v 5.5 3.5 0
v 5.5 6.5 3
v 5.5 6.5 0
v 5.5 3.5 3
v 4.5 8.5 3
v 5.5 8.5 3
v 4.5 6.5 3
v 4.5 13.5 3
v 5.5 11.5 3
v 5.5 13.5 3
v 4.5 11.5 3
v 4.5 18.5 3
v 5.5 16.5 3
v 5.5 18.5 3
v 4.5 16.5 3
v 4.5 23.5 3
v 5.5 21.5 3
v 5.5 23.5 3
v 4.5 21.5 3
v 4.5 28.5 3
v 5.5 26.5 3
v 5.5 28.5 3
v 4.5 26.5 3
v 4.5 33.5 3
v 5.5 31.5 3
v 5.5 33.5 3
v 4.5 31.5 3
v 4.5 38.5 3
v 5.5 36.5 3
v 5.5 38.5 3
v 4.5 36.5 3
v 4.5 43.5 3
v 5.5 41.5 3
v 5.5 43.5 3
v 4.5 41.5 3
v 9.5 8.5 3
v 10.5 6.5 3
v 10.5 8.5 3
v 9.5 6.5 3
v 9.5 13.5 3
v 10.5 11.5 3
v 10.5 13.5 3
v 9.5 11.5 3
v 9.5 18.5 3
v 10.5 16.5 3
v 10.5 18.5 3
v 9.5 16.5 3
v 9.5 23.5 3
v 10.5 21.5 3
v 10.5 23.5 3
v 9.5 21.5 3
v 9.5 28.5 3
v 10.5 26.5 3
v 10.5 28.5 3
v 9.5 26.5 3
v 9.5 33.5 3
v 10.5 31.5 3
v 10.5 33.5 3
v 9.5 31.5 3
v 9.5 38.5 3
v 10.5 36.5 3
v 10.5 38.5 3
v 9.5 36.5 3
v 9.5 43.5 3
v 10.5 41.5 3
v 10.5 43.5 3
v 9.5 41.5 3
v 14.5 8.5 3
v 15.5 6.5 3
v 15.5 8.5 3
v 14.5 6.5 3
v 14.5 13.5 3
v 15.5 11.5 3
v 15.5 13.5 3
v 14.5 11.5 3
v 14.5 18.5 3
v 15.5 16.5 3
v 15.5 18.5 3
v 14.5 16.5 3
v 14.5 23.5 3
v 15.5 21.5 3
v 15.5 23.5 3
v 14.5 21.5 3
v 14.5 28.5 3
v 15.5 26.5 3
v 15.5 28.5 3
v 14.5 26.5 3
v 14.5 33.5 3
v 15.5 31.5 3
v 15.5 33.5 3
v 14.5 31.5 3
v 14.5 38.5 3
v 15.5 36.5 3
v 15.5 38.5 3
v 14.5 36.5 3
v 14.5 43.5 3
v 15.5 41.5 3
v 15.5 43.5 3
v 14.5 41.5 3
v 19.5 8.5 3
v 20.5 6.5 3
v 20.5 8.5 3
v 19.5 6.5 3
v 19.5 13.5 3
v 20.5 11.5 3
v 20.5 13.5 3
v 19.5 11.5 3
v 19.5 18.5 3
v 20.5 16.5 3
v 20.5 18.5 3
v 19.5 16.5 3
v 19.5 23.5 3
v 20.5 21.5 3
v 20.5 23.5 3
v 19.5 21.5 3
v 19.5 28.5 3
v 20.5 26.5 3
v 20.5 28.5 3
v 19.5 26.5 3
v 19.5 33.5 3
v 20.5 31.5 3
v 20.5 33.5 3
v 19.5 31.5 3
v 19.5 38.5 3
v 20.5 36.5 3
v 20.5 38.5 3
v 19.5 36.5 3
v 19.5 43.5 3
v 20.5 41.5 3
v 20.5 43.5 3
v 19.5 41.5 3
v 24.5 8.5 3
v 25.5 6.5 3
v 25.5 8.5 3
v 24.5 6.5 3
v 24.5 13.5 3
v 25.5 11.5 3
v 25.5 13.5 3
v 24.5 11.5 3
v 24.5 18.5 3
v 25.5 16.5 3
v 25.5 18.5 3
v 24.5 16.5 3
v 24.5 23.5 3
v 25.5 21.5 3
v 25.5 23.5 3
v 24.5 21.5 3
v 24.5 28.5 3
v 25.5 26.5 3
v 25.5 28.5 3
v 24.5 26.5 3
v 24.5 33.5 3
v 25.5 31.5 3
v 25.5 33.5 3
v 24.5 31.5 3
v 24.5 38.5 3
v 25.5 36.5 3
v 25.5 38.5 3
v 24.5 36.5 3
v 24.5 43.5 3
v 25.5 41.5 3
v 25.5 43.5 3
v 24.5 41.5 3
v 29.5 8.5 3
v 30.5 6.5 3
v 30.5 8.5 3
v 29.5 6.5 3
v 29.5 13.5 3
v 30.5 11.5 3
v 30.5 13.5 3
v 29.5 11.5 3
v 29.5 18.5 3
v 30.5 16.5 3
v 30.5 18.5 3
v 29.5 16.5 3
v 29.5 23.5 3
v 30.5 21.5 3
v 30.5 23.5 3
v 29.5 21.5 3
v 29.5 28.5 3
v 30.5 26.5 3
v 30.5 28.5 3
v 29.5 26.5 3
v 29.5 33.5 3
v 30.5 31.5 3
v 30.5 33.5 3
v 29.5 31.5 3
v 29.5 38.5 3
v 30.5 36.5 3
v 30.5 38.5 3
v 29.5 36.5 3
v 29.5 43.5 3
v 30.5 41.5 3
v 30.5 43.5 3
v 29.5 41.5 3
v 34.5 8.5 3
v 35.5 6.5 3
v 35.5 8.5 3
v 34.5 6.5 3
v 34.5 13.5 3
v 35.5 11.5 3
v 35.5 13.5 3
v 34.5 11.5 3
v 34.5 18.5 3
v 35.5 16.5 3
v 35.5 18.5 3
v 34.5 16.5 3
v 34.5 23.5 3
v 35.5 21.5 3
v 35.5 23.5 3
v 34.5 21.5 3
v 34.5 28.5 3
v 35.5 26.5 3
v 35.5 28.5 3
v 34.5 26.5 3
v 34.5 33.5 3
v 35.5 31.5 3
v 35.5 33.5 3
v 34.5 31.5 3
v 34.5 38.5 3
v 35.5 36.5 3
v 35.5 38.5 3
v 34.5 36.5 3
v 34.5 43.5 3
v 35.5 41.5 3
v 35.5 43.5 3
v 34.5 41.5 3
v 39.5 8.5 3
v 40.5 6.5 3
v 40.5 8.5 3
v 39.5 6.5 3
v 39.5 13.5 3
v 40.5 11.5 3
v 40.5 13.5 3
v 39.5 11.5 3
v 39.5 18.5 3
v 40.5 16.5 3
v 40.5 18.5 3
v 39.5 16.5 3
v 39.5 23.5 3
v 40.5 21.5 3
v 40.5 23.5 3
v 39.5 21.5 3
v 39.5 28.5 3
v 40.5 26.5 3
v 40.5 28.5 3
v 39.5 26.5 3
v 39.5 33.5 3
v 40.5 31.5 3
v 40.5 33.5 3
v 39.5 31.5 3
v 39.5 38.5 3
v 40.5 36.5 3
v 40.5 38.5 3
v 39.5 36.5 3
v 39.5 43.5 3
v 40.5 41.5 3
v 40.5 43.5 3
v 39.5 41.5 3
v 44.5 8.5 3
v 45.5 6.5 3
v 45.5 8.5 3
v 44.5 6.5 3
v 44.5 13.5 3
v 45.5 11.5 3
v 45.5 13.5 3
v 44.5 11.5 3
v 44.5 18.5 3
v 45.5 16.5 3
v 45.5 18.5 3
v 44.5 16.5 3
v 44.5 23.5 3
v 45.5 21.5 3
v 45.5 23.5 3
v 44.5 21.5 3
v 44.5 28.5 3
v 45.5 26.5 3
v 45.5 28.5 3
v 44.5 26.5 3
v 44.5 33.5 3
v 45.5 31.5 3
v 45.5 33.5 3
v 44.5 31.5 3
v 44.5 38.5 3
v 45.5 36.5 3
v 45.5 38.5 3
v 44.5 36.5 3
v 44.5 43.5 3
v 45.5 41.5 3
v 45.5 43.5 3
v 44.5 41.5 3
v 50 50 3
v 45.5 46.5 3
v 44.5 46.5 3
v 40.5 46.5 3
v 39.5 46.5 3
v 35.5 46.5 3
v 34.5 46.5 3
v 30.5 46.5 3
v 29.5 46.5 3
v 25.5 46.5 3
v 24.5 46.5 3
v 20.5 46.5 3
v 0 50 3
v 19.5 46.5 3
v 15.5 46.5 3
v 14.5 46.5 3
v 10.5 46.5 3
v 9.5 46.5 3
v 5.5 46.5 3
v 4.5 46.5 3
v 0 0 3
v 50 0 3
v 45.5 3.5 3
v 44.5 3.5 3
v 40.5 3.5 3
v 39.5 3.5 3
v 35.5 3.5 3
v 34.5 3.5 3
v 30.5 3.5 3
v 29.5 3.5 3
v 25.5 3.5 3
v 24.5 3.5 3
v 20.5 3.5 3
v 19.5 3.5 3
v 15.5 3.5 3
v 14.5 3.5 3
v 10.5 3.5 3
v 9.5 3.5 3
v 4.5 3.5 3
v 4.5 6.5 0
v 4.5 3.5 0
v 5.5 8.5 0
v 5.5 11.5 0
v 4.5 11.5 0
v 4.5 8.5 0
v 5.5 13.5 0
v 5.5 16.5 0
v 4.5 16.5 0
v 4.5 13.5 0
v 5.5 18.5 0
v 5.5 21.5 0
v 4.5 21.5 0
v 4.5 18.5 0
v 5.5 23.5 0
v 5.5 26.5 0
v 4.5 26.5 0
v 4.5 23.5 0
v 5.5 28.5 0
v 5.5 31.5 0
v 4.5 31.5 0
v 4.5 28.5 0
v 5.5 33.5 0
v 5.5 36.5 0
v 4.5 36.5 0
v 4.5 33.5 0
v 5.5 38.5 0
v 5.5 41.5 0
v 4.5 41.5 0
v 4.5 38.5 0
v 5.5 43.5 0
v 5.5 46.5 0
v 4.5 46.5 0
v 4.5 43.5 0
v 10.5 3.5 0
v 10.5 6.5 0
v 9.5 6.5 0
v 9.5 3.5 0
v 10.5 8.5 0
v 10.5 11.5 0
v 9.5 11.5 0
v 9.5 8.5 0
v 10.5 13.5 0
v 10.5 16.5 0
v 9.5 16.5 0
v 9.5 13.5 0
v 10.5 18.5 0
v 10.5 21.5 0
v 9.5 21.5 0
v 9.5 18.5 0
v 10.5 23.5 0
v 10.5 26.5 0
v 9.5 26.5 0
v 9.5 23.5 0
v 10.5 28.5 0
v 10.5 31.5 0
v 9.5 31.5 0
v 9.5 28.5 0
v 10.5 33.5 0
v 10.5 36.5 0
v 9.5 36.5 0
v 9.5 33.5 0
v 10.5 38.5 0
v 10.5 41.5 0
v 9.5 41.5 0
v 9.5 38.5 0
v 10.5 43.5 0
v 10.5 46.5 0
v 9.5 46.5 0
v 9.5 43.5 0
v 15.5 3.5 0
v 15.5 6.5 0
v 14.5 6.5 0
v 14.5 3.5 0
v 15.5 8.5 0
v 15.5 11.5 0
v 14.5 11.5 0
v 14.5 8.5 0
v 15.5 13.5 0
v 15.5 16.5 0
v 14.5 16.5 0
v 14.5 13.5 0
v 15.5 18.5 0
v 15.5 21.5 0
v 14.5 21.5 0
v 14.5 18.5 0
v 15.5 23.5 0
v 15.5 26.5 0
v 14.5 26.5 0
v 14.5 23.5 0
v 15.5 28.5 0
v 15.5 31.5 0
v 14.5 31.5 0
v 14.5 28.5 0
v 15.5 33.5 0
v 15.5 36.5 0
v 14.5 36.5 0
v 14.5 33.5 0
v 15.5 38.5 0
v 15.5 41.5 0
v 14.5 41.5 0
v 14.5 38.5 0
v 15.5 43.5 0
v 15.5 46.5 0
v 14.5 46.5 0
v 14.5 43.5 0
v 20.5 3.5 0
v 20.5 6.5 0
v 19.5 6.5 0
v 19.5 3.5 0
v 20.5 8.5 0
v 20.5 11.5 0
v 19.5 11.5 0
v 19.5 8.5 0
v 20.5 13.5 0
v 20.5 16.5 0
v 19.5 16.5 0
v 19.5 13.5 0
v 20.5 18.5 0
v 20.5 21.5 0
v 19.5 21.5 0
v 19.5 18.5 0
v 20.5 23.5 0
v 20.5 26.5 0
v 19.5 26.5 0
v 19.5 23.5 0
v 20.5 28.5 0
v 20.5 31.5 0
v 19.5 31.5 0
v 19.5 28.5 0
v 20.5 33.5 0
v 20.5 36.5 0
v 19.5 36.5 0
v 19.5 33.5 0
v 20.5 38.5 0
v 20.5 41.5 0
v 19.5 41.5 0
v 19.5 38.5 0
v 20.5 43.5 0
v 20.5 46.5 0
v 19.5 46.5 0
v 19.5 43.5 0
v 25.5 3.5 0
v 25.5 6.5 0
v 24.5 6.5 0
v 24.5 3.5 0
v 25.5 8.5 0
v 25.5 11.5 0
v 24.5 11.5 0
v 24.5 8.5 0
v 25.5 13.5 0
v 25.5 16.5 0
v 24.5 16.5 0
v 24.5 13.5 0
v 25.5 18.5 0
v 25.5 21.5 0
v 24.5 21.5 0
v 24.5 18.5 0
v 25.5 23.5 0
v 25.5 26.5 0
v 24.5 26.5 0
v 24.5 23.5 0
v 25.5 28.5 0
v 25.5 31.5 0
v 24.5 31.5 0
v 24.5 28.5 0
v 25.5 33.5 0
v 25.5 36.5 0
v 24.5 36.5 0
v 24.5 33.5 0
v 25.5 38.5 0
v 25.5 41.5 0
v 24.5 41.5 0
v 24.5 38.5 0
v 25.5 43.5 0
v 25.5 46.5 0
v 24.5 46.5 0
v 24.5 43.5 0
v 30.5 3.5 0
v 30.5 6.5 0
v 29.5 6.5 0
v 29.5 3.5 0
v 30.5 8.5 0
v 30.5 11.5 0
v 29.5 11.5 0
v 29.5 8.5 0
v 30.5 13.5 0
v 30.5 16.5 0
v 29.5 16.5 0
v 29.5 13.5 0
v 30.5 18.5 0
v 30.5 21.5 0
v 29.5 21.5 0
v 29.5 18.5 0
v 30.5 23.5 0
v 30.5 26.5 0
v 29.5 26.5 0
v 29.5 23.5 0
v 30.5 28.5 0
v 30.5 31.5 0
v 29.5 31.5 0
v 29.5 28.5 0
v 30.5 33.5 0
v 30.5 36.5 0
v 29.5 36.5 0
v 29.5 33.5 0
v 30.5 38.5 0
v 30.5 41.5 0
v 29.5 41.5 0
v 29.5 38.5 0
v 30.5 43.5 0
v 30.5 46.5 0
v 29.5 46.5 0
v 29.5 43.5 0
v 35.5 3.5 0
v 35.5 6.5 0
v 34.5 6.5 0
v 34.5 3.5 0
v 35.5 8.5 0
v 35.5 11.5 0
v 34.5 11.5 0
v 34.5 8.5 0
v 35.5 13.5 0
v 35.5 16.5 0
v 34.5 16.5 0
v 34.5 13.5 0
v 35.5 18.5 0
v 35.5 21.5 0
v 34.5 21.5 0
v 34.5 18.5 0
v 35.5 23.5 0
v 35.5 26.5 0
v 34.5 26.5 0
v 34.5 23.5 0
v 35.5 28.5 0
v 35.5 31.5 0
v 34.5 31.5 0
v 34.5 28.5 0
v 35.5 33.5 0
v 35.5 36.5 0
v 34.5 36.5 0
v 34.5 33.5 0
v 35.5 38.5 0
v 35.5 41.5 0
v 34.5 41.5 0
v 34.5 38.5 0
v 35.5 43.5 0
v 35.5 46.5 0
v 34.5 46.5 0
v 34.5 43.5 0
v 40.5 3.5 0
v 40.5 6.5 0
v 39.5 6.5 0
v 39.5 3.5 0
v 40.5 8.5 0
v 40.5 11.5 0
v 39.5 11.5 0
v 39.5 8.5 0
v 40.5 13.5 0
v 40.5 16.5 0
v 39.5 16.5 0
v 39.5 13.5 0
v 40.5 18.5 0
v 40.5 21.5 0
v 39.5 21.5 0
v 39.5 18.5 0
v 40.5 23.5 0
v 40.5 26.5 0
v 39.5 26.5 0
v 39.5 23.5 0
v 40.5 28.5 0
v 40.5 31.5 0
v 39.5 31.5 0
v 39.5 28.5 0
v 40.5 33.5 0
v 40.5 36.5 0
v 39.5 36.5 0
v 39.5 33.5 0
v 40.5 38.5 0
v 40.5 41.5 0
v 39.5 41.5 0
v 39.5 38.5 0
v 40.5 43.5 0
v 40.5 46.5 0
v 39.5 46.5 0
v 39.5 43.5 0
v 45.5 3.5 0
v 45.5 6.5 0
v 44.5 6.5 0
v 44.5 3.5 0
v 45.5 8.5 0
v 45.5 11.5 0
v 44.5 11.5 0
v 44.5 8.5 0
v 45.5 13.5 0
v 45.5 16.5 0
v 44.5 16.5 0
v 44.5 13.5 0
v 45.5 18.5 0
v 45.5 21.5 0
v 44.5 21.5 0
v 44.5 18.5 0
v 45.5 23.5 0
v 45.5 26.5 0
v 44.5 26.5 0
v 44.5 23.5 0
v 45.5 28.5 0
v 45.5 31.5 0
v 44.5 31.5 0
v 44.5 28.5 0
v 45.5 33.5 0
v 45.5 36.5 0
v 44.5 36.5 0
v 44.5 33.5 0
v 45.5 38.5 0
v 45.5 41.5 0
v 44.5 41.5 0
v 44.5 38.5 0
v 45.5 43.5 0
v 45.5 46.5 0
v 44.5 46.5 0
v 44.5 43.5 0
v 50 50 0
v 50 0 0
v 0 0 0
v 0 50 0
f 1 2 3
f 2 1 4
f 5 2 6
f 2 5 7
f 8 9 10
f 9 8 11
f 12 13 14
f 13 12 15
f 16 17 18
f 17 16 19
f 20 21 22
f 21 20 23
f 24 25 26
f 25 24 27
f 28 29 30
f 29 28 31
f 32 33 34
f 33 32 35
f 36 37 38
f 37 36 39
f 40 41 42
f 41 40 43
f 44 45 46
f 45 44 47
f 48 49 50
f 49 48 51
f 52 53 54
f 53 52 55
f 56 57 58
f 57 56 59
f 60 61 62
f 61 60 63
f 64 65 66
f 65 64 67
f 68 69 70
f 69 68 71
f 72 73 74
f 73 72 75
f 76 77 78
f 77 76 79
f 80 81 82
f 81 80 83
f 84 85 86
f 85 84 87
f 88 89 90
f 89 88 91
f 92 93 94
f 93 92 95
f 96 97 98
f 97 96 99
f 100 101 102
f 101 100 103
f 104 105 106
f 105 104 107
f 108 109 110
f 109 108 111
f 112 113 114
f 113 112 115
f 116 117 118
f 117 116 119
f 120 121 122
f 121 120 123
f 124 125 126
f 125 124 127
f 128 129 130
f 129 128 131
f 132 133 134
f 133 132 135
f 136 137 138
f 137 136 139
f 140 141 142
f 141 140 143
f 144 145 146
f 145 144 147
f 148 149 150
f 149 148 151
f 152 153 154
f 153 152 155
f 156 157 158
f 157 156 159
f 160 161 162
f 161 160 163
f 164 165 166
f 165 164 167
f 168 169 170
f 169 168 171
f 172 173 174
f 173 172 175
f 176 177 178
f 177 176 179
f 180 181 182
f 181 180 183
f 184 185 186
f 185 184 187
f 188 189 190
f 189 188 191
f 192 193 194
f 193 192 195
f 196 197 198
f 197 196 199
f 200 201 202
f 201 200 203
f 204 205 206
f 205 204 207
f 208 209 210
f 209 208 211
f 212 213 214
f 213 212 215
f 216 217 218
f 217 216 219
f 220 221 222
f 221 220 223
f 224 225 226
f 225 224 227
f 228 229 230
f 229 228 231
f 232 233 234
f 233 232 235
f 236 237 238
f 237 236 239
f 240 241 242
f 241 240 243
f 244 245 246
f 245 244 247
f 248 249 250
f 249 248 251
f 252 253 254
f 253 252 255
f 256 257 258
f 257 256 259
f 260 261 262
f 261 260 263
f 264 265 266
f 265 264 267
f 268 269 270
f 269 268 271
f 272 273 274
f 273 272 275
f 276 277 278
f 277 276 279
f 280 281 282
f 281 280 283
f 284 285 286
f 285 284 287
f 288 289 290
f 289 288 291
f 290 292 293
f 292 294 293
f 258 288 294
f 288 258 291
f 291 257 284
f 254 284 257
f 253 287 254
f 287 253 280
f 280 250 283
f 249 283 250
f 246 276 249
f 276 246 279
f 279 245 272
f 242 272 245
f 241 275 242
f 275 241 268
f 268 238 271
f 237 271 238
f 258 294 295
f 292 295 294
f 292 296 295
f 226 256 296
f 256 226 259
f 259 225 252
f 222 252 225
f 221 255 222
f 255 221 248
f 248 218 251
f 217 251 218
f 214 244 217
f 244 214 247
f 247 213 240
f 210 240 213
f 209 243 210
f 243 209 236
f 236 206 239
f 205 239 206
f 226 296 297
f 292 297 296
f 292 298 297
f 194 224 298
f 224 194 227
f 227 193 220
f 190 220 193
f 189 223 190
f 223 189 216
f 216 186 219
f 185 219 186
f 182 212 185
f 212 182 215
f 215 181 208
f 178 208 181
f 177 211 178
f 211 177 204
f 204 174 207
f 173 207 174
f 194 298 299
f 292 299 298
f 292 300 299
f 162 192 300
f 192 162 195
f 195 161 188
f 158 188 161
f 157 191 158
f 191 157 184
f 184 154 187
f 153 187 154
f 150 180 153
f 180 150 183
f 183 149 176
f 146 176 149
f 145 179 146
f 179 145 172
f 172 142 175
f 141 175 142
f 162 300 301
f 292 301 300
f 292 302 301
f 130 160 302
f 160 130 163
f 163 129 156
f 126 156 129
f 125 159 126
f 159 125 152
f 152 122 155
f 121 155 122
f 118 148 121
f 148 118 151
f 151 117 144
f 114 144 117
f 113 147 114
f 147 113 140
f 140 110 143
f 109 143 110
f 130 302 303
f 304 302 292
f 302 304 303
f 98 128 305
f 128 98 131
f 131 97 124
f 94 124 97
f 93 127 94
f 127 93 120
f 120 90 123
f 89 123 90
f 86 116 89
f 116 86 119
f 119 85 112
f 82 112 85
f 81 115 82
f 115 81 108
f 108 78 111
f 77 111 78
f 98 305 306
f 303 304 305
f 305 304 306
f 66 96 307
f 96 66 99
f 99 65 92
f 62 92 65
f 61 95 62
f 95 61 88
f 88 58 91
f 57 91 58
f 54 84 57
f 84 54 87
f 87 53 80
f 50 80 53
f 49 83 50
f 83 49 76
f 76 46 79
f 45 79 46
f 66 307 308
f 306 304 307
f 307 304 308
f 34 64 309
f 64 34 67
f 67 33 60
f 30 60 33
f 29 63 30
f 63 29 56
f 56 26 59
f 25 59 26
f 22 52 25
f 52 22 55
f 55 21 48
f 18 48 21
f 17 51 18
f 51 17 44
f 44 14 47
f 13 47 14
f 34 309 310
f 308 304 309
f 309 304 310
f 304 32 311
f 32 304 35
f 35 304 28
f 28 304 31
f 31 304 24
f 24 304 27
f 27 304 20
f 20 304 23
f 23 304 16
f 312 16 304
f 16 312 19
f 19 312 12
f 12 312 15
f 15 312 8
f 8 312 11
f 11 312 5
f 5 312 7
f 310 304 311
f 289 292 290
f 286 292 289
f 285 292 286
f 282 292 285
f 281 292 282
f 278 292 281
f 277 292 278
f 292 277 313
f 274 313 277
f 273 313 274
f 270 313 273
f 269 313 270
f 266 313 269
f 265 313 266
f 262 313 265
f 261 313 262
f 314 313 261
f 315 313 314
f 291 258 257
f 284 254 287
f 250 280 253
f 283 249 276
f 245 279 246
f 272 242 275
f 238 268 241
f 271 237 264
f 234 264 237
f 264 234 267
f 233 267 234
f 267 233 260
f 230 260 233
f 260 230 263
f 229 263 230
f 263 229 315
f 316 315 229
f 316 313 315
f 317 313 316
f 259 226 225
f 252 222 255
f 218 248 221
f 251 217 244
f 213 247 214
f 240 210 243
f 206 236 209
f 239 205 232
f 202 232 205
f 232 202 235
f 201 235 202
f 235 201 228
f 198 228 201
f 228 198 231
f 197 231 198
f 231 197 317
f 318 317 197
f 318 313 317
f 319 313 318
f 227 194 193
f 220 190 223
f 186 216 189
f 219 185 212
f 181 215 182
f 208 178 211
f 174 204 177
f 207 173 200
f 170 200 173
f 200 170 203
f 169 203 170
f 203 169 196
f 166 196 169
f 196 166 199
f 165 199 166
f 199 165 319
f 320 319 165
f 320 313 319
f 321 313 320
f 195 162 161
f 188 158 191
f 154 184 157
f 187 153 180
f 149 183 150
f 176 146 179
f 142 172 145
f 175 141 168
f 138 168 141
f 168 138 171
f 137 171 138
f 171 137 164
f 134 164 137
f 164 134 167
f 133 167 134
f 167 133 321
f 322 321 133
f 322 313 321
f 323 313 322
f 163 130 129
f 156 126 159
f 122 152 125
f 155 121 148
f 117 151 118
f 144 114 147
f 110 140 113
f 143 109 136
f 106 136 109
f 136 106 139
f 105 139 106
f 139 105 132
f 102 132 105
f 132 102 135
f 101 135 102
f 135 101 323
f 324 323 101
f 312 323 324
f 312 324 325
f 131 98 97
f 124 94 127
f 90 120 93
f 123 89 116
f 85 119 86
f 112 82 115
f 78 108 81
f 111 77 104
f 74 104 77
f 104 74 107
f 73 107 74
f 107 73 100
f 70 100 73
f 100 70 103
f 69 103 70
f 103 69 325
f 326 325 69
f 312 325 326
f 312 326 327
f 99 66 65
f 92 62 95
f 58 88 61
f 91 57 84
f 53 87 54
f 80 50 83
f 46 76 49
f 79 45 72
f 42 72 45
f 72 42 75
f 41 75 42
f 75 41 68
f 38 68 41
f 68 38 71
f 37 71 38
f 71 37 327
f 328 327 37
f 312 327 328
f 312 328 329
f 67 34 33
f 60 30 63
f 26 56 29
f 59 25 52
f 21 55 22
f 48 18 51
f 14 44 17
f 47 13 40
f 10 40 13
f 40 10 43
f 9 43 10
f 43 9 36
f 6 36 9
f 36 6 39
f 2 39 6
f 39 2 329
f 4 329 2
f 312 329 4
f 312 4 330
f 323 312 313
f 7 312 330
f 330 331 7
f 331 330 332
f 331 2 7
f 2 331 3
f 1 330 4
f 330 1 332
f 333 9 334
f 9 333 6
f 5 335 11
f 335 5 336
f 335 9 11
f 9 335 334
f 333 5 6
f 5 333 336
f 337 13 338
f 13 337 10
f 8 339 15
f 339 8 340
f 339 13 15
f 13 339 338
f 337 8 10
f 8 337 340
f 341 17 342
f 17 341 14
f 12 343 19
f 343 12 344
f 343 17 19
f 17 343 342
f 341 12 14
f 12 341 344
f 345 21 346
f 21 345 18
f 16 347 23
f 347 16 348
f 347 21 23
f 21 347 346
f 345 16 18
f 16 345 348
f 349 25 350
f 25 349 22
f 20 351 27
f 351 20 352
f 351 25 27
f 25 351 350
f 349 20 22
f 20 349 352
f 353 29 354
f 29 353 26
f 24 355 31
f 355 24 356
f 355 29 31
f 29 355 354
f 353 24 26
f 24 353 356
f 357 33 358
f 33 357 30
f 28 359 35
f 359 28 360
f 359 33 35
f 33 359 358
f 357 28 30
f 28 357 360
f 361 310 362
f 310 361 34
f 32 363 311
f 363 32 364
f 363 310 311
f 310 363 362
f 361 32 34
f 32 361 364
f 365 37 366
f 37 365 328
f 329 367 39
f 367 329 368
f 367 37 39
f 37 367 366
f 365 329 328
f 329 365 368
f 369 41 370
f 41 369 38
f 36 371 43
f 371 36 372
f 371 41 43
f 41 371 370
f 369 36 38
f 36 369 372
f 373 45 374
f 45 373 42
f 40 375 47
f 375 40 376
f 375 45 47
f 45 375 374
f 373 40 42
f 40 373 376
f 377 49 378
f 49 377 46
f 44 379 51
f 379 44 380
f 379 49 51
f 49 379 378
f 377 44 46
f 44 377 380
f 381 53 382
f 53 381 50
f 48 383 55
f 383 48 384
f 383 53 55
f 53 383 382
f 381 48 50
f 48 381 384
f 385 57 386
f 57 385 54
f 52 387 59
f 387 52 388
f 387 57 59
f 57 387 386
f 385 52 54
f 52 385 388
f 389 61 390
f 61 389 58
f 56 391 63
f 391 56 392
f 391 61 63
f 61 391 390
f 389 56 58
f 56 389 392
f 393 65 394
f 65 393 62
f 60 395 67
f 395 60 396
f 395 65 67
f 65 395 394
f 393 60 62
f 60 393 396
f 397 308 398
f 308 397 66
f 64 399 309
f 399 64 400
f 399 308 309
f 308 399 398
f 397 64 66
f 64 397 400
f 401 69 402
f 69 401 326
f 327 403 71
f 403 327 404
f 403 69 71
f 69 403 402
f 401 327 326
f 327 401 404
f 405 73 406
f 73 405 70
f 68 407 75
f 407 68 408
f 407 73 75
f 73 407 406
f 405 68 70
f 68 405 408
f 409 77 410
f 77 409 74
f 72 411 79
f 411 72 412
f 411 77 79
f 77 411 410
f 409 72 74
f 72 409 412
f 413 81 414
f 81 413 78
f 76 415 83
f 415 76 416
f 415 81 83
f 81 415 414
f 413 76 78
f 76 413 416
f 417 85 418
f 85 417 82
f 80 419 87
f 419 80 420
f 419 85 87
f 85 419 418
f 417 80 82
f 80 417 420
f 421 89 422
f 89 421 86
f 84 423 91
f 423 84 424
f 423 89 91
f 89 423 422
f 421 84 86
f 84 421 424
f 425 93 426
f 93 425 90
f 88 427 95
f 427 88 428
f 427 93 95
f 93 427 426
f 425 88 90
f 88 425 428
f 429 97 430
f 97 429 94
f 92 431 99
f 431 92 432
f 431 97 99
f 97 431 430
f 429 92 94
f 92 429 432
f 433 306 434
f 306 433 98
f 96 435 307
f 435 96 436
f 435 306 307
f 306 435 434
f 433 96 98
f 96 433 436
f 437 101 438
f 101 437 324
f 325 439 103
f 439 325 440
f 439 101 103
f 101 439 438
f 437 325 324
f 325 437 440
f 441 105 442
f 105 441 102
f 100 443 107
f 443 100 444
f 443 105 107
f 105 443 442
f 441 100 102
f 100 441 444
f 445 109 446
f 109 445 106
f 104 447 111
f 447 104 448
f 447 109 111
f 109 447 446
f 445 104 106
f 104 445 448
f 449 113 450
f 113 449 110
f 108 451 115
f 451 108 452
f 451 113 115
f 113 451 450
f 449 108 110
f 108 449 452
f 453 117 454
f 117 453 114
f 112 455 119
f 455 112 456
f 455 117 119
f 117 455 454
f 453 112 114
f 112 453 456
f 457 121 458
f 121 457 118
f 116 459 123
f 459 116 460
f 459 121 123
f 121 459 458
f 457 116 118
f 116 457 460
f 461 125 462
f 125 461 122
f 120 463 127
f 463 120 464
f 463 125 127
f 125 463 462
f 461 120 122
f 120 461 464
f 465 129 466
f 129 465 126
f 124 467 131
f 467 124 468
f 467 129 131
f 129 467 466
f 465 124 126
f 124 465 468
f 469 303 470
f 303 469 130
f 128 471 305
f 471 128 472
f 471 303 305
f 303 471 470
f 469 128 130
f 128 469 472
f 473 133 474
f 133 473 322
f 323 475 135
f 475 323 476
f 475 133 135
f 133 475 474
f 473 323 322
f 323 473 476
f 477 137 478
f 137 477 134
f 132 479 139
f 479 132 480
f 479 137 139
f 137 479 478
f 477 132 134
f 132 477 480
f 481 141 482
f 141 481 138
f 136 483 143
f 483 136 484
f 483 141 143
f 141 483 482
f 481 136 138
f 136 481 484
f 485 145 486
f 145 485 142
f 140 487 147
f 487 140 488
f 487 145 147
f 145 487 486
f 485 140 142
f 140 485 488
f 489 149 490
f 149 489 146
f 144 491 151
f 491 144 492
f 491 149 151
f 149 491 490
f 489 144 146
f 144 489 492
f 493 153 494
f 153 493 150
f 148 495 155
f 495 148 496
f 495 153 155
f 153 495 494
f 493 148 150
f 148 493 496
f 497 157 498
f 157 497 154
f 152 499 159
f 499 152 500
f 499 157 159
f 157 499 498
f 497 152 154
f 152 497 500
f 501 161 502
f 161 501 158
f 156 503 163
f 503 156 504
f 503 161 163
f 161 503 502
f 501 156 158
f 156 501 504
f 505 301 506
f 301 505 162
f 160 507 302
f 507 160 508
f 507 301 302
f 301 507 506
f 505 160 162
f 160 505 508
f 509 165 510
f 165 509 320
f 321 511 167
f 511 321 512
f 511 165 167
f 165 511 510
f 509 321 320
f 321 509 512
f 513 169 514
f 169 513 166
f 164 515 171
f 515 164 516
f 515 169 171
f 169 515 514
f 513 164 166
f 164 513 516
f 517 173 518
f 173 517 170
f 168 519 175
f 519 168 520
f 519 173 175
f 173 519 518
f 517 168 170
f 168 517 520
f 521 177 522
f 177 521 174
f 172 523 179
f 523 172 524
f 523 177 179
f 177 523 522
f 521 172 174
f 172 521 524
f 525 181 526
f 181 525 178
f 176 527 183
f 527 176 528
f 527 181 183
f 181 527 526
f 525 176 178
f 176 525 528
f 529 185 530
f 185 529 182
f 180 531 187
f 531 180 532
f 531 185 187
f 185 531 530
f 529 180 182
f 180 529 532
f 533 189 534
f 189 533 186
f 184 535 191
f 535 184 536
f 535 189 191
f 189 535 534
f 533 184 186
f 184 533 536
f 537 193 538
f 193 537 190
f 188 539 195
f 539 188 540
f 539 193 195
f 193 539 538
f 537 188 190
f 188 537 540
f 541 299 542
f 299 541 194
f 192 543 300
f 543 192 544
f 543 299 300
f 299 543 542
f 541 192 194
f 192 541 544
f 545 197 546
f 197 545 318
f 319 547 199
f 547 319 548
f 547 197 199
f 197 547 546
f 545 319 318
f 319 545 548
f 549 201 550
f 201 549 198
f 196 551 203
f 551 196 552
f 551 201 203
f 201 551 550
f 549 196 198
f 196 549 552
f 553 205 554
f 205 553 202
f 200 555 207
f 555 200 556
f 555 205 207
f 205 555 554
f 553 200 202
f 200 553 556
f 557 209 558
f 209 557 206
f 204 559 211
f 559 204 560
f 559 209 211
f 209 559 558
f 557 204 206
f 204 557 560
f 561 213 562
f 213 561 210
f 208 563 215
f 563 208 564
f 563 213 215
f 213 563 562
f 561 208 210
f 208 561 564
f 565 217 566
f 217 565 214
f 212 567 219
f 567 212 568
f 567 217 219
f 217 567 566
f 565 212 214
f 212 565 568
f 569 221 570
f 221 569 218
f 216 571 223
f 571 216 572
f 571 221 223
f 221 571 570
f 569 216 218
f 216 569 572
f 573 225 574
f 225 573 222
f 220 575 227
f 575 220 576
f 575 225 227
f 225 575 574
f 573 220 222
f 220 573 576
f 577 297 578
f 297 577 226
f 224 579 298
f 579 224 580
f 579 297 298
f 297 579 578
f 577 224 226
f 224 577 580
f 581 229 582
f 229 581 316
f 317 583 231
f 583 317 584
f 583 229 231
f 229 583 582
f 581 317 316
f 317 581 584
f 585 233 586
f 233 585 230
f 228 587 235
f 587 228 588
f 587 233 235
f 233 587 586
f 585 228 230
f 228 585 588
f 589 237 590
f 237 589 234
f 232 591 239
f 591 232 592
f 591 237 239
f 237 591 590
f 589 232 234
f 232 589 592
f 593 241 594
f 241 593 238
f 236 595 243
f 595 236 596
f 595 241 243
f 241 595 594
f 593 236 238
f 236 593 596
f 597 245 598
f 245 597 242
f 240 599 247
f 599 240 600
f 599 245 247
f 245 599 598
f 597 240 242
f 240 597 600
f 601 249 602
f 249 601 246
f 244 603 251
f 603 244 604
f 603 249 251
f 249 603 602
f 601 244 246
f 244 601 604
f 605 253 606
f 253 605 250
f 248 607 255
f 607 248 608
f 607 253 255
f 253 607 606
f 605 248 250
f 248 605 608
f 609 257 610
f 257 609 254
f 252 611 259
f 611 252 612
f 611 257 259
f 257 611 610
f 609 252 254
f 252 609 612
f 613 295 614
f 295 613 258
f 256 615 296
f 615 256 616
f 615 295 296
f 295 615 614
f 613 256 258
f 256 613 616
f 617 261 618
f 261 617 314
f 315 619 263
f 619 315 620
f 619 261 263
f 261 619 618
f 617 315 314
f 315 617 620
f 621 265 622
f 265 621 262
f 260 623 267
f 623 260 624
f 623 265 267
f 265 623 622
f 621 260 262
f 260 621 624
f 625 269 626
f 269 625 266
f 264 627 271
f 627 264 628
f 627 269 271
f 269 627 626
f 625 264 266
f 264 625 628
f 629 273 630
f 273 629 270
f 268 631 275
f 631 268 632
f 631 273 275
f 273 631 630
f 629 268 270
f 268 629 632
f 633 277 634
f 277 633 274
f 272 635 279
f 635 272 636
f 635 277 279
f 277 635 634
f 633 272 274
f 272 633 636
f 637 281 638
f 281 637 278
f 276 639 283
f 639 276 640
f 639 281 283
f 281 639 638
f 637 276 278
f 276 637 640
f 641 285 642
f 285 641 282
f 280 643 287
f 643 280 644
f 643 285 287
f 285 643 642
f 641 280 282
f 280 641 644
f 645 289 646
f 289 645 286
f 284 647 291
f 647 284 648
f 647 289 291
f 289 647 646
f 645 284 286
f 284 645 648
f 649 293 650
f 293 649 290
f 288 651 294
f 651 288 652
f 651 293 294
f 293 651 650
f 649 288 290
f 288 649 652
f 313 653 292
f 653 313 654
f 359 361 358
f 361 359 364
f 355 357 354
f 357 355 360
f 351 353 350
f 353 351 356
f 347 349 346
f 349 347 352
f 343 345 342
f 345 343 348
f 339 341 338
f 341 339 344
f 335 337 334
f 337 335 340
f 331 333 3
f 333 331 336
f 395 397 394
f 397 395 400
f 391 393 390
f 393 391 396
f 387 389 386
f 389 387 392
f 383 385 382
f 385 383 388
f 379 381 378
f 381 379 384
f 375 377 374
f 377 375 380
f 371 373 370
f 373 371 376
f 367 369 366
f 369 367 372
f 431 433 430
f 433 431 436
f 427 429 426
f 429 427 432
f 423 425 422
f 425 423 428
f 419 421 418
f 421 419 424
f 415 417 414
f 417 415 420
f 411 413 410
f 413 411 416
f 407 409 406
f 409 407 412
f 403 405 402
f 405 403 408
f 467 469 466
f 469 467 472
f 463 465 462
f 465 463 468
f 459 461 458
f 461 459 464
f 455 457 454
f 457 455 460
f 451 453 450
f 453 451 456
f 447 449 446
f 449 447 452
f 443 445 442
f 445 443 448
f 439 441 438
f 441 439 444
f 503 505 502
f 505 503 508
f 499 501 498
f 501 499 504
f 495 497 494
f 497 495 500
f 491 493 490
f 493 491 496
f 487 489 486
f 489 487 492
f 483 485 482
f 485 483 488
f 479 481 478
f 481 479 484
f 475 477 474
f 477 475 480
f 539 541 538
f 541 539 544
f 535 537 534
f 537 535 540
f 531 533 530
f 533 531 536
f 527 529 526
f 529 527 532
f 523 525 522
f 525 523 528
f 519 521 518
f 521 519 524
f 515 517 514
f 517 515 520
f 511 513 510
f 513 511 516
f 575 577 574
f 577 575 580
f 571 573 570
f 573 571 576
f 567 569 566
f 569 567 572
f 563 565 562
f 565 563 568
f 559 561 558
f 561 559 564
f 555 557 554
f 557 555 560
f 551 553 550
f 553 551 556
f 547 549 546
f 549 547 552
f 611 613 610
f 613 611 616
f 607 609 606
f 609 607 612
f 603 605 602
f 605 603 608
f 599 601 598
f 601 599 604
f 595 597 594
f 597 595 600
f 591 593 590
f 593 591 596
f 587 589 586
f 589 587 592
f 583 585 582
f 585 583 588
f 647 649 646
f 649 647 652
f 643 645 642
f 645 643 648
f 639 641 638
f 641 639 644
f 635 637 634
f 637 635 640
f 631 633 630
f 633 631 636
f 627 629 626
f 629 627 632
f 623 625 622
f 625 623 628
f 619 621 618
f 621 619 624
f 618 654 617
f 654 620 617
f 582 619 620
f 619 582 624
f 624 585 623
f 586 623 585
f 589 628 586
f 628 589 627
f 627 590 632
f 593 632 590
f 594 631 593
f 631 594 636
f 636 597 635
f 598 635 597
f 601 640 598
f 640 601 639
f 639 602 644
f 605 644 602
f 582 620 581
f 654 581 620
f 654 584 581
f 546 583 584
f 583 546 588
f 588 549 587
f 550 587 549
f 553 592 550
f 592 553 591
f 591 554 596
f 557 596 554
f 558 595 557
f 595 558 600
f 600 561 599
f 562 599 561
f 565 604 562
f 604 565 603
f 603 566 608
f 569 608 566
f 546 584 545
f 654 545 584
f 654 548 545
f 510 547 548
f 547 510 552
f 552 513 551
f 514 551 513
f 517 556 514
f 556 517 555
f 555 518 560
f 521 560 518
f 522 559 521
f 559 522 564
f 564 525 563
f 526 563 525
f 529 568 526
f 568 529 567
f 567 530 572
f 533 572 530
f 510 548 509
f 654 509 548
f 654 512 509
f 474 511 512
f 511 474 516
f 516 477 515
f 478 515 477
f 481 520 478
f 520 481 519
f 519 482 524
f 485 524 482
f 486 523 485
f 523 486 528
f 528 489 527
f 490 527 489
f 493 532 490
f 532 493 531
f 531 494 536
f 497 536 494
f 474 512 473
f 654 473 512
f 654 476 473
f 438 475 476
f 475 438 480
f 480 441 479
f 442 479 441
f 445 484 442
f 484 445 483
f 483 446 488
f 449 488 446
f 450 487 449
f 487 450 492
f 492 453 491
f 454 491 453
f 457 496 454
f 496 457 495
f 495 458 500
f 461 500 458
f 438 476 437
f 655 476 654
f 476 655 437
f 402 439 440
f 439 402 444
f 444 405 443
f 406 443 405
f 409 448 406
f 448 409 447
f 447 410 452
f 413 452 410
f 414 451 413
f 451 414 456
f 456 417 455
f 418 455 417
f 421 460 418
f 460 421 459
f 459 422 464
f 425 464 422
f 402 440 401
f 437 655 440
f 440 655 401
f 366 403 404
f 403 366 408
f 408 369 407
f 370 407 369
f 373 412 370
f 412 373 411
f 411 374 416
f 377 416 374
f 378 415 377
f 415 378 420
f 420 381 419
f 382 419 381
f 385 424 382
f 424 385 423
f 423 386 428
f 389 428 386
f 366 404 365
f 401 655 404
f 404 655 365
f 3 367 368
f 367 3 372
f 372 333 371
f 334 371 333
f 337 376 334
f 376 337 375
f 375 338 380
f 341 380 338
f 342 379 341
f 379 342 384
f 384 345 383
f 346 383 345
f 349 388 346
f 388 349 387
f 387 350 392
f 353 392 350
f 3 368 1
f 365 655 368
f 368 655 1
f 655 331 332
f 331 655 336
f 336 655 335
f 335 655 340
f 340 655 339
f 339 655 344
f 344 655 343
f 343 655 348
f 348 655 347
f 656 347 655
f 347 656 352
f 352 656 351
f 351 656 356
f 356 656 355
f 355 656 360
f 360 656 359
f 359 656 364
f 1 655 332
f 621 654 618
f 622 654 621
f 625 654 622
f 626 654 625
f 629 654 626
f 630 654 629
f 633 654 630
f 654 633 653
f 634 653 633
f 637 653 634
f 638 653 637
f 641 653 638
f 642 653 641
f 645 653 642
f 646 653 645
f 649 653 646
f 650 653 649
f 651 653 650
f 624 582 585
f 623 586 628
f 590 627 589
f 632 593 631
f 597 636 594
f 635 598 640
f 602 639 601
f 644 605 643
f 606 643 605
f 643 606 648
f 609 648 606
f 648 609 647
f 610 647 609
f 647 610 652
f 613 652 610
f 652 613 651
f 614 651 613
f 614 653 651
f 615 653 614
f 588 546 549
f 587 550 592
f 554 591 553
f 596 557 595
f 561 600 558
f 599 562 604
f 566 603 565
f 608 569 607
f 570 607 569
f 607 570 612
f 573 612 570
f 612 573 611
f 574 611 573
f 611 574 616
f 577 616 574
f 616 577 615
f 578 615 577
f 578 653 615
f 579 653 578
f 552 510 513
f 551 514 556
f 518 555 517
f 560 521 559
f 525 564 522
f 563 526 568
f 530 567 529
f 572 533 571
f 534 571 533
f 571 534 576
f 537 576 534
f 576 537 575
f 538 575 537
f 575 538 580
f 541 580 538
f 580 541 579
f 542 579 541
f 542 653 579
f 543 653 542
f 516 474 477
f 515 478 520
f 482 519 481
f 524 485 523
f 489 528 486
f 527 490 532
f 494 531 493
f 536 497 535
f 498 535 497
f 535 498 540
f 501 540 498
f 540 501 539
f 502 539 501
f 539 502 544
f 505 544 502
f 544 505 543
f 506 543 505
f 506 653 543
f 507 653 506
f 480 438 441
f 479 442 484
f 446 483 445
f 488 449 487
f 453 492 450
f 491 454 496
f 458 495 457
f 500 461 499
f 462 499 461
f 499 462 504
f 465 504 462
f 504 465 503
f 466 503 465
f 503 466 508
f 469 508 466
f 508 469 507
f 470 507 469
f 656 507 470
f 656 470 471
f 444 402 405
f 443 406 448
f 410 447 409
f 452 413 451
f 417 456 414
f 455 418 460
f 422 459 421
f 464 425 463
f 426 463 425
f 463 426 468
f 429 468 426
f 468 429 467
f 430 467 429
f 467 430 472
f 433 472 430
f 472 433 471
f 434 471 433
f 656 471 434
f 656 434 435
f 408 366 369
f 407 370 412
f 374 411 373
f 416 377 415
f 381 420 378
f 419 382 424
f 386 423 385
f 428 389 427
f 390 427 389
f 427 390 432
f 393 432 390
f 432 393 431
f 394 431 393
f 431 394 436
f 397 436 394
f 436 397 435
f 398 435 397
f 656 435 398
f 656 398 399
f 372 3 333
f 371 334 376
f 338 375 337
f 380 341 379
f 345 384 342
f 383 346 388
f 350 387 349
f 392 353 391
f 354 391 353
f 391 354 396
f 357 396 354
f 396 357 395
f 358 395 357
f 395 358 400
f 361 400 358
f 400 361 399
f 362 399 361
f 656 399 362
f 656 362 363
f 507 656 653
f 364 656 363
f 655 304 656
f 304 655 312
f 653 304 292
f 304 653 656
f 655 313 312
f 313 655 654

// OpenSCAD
// [FL_INDEX: keywords="openscad, 3d_parametric, Zip_Plate_Customizer, csg_solid" | COT="Parametric OpenSCAD design from 3DCodeverse"]
// Title: Zip Plate Customizer

/*	Zip-Plate Custome Plate
	Created by Newton Robinson

	Zip-Plate is a construction set that is connected with 4" zip ties
	
	My plan is to create a set of pieces that can be used as a platform for robots.
*/

//Height of the Zip-Plate in mm: 
Height = 3;				// [1:5]	
//Length should be in a multiple of Spacing: 
Length = 50;			// [10:200:5] 
//Width should be in a multiple of Spacing: 
Width = 50;				// [10:200] 
//Spacing between holes in mm: 
Spacing = 5;			// [5:20]
// Height of the zip tie (Flat part): 
Zip_Tie_Height = 1;	// [1:2] 
// Width of the zip tie: 
Zip_Tie_Width = 3;	// [3:5] 

difference() {
	cube(size = [Length, Width, Height], center = false);
	for (x = [Spacing : Spacing : Length - Spacing] )
	{
		for (y = [Spacing : Spacing : Width - Spacing] )
		{
			translate ([ x , y , 0 ]) cube( size = [Zip_Tie_Height, Zip_Tie_Width, Height * 2], center = true);
		}
	}
}
